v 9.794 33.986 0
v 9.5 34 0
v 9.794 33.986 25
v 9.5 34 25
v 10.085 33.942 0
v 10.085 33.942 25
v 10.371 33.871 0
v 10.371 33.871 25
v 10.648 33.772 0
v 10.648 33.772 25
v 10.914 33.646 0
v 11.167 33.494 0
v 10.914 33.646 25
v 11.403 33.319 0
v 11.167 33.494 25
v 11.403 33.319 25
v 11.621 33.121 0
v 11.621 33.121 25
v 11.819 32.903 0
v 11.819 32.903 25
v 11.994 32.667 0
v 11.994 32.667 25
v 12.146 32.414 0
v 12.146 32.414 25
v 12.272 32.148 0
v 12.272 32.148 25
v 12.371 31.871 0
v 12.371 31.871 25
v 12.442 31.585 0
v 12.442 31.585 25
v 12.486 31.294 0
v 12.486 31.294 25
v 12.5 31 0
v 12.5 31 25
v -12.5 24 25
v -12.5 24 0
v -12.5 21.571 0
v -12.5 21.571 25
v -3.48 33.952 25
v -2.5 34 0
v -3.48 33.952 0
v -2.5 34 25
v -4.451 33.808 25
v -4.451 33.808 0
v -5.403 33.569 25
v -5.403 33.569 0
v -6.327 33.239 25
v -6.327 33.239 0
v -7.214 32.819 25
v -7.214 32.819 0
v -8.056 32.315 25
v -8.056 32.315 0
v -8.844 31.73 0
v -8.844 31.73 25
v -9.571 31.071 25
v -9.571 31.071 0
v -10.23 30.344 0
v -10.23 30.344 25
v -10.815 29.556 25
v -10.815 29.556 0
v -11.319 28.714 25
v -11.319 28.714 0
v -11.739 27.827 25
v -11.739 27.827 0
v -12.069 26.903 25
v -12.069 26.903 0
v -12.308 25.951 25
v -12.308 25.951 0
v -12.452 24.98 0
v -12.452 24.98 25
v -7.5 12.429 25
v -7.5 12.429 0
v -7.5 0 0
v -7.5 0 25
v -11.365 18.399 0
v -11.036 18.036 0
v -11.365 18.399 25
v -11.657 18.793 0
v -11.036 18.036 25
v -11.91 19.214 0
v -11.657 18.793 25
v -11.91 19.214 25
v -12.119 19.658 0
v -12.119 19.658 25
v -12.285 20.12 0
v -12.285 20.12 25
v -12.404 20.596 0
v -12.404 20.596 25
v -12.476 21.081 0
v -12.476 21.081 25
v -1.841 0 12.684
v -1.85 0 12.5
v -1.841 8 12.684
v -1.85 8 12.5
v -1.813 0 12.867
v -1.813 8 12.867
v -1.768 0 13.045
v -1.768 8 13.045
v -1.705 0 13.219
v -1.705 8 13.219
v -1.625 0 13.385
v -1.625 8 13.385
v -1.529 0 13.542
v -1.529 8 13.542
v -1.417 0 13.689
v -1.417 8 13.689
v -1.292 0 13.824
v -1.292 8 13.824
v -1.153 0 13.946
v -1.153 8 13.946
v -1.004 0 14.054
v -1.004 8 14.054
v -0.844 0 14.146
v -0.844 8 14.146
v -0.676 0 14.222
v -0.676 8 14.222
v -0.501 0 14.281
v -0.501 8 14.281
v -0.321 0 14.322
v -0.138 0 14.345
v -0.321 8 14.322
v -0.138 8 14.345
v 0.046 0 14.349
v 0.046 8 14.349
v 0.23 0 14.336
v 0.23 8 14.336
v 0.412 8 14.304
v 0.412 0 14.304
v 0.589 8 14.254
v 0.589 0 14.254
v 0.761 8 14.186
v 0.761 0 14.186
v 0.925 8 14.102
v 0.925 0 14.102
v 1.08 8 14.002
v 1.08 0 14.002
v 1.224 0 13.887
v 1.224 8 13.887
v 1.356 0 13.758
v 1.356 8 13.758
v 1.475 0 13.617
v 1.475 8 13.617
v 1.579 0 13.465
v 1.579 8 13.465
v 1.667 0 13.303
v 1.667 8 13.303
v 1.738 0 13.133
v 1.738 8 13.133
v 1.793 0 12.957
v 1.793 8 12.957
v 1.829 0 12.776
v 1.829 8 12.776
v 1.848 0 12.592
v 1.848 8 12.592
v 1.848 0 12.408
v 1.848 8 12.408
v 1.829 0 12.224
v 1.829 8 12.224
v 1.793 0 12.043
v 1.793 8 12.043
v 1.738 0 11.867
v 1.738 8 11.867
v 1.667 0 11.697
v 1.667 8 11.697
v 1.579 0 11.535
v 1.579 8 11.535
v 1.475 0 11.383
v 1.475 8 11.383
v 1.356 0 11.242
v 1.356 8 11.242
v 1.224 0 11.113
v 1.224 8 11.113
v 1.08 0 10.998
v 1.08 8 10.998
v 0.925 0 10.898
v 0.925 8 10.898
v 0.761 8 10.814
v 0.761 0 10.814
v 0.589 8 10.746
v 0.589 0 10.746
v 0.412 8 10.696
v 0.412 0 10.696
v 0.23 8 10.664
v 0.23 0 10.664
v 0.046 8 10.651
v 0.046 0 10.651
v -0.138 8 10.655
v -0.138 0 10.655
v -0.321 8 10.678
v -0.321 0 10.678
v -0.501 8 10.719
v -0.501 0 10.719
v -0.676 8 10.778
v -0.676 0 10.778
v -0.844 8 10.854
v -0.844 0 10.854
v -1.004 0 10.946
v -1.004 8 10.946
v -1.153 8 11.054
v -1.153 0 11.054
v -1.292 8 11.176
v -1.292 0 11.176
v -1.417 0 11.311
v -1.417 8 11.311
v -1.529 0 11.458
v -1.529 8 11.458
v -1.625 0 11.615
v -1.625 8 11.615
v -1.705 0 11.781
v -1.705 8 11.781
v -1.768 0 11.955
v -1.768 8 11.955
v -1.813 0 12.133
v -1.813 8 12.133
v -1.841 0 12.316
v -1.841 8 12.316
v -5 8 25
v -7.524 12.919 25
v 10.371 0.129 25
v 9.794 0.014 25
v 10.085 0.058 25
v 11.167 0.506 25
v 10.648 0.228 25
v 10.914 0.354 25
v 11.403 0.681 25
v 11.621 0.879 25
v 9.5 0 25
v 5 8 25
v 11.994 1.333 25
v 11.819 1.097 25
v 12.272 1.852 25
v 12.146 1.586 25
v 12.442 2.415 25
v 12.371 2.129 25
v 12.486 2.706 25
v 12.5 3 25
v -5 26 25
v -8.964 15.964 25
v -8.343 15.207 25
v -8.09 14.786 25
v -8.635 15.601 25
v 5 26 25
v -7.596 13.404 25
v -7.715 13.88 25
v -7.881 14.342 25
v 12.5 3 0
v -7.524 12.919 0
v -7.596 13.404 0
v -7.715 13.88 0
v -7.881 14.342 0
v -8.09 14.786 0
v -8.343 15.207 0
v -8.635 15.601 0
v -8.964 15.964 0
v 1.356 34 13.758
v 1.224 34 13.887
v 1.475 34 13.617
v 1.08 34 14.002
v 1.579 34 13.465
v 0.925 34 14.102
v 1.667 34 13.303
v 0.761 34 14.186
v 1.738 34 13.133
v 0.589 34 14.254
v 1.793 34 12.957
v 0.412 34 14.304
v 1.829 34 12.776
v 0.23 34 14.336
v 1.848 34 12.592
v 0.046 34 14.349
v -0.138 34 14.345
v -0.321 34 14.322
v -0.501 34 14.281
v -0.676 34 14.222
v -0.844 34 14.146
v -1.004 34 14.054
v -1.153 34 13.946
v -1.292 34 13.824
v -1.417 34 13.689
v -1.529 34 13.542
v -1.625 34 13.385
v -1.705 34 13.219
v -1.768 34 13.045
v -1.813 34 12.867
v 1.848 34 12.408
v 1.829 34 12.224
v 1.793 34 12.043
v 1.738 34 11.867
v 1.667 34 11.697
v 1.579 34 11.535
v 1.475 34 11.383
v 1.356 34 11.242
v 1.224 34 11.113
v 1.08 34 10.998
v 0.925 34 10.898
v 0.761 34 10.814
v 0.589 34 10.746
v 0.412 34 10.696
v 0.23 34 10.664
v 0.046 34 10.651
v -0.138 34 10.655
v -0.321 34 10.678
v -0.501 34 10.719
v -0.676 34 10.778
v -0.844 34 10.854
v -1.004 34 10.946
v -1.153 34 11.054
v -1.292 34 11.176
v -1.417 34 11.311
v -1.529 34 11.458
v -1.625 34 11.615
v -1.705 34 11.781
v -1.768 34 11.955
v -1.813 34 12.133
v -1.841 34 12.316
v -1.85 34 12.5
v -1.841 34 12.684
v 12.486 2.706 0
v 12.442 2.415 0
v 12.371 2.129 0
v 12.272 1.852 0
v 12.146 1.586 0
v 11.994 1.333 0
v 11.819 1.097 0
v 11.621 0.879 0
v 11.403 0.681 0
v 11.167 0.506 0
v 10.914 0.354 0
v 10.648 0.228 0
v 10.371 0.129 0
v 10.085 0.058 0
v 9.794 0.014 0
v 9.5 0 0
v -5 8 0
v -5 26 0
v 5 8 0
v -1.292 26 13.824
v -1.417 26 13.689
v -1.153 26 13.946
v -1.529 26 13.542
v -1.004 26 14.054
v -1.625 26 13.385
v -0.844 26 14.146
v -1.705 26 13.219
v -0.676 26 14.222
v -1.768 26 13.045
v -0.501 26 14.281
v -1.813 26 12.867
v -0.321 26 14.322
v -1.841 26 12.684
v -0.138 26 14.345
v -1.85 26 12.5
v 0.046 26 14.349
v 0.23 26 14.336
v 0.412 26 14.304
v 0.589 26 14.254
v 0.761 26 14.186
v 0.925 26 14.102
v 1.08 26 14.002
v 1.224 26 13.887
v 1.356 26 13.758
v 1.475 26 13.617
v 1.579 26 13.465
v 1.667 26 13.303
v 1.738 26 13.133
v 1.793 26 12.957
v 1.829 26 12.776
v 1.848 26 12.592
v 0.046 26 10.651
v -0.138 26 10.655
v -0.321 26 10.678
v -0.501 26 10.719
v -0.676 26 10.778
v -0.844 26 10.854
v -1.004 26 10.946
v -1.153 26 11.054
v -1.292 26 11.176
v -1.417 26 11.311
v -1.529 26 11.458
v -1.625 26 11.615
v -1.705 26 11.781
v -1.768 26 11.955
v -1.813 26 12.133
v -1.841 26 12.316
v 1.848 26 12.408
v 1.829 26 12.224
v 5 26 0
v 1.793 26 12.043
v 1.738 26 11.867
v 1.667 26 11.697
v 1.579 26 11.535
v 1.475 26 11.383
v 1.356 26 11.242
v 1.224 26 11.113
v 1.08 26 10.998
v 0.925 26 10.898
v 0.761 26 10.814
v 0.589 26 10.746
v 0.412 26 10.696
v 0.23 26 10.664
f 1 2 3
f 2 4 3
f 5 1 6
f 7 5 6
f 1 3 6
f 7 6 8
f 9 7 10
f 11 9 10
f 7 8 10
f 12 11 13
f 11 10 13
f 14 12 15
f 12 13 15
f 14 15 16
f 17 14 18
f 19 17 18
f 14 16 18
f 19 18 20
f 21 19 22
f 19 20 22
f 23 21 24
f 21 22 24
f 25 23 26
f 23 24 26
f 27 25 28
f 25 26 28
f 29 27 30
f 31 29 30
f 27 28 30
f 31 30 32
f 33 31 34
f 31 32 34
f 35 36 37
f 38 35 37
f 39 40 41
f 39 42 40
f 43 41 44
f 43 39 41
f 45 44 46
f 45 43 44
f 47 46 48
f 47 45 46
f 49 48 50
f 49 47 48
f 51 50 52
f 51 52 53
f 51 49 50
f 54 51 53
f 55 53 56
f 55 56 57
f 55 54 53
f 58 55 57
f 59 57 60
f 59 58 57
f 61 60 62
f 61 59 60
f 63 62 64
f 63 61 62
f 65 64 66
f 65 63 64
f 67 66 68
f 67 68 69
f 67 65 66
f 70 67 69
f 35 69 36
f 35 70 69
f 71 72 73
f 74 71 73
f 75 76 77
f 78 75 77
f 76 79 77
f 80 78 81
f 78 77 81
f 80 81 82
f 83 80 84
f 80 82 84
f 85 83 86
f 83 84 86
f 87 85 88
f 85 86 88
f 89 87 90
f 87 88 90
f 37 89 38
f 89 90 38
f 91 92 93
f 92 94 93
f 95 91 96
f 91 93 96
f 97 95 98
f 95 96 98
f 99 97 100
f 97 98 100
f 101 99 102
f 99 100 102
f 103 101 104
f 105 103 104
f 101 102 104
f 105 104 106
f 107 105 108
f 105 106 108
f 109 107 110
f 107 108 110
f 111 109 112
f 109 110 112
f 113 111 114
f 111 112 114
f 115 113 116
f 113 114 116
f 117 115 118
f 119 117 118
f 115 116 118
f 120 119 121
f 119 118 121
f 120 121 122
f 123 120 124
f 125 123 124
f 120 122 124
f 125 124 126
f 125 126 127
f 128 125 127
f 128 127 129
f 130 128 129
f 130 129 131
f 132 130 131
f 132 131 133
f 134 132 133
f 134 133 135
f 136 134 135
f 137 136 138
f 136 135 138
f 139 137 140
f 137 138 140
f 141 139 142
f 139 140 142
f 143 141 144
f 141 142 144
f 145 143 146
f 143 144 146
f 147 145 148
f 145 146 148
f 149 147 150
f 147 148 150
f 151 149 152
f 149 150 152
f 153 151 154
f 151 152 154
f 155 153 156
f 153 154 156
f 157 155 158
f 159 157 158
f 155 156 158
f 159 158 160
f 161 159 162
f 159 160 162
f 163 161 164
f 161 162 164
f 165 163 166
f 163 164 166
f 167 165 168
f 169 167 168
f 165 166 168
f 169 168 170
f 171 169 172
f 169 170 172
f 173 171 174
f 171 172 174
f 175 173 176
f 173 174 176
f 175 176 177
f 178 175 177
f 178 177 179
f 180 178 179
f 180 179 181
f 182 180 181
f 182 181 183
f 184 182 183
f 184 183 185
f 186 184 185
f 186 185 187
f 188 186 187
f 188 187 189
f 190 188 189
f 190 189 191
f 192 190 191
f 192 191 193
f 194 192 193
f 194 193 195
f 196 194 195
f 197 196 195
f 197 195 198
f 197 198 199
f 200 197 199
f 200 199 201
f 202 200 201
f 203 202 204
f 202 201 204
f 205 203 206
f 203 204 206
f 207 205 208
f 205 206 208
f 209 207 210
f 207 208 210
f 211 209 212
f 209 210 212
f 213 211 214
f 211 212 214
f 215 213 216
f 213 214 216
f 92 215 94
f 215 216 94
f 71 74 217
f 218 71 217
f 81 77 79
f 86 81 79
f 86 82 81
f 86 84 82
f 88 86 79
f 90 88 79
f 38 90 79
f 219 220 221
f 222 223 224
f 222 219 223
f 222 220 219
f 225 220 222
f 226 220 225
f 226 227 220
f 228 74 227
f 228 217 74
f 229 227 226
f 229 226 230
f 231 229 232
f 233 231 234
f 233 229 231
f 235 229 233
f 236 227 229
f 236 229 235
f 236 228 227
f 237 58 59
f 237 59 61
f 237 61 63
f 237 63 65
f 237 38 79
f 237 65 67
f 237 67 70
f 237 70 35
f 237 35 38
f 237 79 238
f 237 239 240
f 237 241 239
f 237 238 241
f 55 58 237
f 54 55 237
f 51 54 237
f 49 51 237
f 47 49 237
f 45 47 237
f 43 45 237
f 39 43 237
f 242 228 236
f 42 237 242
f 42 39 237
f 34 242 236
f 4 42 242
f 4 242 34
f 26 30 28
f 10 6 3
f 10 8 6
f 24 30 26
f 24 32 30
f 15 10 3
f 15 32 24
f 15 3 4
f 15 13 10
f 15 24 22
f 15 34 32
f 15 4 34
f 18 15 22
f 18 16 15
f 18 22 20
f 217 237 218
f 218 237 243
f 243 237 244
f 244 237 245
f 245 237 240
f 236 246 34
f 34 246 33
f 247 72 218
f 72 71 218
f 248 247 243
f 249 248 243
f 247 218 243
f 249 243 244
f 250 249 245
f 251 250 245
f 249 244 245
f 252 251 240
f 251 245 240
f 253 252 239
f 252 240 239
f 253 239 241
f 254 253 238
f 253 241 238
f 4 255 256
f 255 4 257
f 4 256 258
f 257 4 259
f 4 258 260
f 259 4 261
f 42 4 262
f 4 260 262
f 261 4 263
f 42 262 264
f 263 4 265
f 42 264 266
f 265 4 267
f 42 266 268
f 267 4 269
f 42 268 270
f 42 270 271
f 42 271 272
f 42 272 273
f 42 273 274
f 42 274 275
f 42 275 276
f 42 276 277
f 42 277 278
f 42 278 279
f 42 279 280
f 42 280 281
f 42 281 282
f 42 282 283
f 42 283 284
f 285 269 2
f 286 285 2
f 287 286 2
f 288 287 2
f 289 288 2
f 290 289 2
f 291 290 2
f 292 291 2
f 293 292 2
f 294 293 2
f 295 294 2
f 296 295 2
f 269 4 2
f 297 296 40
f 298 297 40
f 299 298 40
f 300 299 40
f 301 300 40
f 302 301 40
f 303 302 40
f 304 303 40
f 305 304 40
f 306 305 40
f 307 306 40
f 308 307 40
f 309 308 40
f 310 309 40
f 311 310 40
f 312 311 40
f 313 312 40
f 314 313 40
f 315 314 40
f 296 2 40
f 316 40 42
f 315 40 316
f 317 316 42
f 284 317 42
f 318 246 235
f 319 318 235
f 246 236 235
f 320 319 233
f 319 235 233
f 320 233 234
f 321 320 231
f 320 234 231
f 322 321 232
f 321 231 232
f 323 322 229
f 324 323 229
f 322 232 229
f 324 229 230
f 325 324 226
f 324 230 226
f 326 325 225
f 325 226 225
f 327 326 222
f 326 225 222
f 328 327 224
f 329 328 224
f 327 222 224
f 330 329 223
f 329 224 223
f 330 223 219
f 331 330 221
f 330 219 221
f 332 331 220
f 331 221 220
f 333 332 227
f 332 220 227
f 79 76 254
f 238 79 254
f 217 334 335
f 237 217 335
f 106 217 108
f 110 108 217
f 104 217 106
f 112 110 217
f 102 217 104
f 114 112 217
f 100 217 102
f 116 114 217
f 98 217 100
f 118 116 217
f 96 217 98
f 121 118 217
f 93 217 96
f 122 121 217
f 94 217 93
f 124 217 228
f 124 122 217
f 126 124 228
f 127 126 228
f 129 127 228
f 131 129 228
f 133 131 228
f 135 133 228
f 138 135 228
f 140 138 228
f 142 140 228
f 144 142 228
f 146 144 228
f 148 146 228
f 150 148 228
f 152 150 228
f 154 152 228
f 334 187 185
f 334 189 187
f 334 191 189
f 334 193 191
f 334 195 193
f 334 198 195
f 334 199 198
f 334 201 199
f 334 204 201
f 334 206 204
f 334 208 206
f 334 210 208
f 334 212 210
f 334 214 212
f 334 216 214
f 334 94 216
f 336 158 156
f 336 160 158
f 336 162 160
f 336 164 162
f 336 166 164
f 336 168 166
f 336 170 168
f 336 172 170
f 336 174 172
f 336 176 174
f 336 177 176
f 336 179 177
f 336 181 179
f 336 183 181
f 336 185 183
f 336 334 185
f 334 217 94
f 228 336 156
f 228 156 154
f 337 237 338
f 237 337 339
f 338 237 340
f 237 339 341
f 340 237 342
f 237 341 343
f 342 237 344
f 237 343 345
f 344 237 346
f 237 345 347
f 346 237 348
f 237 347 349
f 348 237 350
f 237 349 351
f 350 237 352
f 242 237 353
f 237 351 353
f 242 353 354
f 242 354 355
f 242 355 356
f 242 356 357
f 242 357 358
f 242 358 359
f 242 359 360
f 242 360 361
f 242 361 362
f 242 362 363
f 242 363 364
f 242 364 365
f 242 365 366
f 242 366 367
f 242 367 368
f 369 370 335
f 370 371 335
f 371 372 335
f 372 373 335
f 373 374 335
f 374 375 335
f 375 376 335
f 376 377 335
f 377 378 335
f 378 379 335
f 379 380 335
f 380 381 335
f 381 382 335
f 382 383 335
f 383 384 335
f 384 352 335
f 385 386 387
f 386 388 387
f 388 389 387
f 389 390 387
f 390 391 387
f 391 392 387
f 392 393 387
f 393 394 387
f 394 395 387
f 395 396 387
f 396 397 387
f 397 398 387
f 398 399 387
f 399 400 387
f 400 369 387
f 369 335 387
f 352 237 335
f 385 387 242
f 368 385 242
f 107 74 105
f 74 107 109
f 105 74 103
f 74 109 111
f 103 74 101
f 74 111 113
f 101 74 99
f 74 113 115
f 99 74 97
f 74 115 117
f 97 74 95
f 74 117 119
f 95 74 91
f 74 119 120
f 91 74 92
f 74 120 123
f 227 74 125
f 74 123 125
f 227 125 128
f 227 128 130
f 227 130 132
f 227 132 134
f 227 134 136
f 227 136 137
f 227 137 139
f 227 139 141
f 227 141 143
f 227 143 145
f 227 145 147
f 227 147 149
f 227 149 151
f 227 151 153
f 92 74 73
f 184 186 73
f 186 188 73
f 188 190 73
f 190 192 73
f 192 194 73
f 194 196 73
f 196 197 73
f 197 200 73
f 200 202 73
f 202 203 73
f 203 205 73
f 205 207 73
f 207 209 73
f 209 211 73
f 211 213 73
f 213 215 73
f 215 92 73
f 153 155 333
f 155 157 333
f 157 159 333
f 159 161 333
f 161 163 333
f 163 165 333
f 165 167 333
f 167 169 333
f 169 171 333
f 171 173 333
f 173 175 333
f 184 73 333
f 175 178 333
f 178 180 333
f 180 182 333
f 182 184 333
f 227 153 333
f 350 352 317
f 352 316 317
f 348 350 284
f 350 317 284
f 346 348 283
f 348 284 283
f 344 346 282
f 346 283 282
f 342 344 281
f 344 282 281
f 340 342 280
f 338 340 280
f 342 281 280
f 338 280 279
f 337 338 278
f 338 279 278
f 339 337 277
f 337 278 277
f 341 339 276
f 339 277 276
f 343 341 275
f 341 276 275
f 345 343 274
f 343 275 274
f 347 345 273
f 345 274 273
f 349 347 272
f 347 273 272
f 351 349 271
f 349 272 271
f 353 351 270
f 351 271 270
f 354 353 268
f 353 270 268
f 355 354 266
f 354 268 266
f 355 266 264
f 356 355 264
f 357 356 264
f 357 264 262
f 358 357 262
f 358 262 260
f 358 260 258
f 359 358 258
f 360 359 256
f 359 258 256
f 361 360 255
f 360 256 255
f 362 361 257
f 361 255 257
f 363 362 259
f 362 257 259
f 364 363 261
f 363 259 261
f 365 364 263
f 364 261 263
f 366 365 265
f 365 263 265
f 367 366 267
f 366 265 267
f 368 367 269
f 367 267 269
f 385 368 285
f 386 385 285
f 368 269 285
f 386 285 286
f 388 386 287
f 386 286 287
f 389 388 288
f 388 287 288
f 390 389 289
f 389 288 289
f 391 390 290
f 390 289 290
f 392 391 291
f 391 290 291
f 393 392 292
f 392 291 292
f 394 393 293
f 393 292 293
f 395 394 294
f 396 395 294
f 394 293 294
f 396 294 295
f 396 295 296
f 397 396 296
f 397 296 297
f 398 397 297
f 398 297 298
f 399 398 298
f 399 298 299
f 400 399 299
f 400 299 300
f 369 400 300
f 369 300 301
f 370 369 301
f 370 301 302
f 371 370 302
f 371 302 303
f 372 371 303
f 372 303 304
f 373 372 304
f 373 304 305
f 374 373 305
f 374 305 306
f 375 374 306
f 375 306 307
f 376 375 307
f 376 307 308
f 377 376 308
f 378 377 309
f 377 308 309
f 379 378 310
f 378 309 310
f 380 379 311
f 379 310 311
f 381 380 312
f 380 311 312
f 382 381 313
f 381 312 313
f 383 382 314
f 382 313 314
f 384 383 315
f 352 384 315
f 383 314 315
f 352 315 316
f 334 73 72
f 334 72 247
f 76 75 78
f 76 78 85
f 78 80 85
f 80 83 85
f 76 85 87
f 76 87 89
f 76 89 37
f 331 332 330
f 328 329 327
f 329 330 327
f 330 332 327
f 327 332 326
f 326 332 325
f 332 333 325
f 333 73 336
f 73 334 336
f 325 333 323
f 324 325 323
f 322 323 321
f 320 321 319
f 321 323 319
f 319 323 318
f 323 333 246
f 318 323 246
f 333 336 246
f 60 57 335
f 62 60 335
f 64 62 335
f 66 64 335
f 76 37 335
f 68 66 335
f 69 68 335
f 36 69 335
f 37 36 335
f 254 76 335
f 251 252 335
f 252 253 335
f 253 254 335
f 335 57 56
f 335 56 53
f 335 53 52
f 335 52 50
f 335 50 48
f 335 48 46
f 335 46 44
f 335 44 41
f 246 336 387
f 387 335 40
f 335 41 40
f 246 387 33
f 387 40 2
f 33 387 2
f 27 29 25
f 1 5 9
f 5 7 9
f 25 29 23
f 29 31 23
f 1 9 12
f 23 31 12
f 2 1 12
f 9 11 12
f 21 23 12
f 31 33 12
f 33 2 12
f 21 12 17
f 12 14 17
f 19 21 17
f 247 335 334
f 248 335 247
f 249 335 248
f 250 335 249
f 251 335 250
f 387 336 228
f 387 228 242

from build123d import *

# Parameters (mm, degrees)
F0_W     = 10
F0_H     = 18
F1_DEPTH = 25
F2_R     = 5
F3_R     = 1.85
F4_DEPTH = 50
F5_R     = 10
F6_R     = 3


with BuildPart() as f1:
    # F0 (on Top) → F1 (new body)
    with BuildSketch(Plane.XY):
        Polygon((-7.5, 0), (0, 0), (7.5, 0), (12.5, 0), (12.5, 19.5), (12.5, 34), (0, 34), (-12.5, 34), (-12.5, 19.5), (-7.5, 14.5), align=None)
        with Locations((0, 17)):
            Rectangle(F0_W, F0_H, mode=Mode.SUBTRACT)
    extrude(amount=F1_DEPTH)

    # F2
    f2_edges = [f1.edges().sort_by_distance(p)[0] for p in [
        (-12.5, 19.5, 12.5),
        (-7.5, 14.5, 12.5),
    ]]
    fillet(f2_edges, radius=F2_R)

    # F3 (on face) → F4 (cut, symmetric)
    with BuildSketch(Plane(origin=(0, 8, 0), x_dir=(-1, 0, 0), z_dir=(0, 1, 0))):
        with Locations((0, 12.5)):
            Circle(F3_R)
    extrude(amount=F4_DEPTH, both=True, mode=Mode.SUBTRACT)

    # F5
    f5_edges = [f1.edges().sort_by_distance(p)[0] for p in [
        (-12.5, 34, 12.5),
    ]]
    fillet(f5_edges, radius=F5_R)

    # F6
    f6_edges = [f1.edges().sort_by_distance(p)[0] for p in [
        (12.5, 34, 12.5),
        (12.5, 0, 12.5),
    ]]
    fillet(f6_edges, radius=F6_R)


solid = f1.part
